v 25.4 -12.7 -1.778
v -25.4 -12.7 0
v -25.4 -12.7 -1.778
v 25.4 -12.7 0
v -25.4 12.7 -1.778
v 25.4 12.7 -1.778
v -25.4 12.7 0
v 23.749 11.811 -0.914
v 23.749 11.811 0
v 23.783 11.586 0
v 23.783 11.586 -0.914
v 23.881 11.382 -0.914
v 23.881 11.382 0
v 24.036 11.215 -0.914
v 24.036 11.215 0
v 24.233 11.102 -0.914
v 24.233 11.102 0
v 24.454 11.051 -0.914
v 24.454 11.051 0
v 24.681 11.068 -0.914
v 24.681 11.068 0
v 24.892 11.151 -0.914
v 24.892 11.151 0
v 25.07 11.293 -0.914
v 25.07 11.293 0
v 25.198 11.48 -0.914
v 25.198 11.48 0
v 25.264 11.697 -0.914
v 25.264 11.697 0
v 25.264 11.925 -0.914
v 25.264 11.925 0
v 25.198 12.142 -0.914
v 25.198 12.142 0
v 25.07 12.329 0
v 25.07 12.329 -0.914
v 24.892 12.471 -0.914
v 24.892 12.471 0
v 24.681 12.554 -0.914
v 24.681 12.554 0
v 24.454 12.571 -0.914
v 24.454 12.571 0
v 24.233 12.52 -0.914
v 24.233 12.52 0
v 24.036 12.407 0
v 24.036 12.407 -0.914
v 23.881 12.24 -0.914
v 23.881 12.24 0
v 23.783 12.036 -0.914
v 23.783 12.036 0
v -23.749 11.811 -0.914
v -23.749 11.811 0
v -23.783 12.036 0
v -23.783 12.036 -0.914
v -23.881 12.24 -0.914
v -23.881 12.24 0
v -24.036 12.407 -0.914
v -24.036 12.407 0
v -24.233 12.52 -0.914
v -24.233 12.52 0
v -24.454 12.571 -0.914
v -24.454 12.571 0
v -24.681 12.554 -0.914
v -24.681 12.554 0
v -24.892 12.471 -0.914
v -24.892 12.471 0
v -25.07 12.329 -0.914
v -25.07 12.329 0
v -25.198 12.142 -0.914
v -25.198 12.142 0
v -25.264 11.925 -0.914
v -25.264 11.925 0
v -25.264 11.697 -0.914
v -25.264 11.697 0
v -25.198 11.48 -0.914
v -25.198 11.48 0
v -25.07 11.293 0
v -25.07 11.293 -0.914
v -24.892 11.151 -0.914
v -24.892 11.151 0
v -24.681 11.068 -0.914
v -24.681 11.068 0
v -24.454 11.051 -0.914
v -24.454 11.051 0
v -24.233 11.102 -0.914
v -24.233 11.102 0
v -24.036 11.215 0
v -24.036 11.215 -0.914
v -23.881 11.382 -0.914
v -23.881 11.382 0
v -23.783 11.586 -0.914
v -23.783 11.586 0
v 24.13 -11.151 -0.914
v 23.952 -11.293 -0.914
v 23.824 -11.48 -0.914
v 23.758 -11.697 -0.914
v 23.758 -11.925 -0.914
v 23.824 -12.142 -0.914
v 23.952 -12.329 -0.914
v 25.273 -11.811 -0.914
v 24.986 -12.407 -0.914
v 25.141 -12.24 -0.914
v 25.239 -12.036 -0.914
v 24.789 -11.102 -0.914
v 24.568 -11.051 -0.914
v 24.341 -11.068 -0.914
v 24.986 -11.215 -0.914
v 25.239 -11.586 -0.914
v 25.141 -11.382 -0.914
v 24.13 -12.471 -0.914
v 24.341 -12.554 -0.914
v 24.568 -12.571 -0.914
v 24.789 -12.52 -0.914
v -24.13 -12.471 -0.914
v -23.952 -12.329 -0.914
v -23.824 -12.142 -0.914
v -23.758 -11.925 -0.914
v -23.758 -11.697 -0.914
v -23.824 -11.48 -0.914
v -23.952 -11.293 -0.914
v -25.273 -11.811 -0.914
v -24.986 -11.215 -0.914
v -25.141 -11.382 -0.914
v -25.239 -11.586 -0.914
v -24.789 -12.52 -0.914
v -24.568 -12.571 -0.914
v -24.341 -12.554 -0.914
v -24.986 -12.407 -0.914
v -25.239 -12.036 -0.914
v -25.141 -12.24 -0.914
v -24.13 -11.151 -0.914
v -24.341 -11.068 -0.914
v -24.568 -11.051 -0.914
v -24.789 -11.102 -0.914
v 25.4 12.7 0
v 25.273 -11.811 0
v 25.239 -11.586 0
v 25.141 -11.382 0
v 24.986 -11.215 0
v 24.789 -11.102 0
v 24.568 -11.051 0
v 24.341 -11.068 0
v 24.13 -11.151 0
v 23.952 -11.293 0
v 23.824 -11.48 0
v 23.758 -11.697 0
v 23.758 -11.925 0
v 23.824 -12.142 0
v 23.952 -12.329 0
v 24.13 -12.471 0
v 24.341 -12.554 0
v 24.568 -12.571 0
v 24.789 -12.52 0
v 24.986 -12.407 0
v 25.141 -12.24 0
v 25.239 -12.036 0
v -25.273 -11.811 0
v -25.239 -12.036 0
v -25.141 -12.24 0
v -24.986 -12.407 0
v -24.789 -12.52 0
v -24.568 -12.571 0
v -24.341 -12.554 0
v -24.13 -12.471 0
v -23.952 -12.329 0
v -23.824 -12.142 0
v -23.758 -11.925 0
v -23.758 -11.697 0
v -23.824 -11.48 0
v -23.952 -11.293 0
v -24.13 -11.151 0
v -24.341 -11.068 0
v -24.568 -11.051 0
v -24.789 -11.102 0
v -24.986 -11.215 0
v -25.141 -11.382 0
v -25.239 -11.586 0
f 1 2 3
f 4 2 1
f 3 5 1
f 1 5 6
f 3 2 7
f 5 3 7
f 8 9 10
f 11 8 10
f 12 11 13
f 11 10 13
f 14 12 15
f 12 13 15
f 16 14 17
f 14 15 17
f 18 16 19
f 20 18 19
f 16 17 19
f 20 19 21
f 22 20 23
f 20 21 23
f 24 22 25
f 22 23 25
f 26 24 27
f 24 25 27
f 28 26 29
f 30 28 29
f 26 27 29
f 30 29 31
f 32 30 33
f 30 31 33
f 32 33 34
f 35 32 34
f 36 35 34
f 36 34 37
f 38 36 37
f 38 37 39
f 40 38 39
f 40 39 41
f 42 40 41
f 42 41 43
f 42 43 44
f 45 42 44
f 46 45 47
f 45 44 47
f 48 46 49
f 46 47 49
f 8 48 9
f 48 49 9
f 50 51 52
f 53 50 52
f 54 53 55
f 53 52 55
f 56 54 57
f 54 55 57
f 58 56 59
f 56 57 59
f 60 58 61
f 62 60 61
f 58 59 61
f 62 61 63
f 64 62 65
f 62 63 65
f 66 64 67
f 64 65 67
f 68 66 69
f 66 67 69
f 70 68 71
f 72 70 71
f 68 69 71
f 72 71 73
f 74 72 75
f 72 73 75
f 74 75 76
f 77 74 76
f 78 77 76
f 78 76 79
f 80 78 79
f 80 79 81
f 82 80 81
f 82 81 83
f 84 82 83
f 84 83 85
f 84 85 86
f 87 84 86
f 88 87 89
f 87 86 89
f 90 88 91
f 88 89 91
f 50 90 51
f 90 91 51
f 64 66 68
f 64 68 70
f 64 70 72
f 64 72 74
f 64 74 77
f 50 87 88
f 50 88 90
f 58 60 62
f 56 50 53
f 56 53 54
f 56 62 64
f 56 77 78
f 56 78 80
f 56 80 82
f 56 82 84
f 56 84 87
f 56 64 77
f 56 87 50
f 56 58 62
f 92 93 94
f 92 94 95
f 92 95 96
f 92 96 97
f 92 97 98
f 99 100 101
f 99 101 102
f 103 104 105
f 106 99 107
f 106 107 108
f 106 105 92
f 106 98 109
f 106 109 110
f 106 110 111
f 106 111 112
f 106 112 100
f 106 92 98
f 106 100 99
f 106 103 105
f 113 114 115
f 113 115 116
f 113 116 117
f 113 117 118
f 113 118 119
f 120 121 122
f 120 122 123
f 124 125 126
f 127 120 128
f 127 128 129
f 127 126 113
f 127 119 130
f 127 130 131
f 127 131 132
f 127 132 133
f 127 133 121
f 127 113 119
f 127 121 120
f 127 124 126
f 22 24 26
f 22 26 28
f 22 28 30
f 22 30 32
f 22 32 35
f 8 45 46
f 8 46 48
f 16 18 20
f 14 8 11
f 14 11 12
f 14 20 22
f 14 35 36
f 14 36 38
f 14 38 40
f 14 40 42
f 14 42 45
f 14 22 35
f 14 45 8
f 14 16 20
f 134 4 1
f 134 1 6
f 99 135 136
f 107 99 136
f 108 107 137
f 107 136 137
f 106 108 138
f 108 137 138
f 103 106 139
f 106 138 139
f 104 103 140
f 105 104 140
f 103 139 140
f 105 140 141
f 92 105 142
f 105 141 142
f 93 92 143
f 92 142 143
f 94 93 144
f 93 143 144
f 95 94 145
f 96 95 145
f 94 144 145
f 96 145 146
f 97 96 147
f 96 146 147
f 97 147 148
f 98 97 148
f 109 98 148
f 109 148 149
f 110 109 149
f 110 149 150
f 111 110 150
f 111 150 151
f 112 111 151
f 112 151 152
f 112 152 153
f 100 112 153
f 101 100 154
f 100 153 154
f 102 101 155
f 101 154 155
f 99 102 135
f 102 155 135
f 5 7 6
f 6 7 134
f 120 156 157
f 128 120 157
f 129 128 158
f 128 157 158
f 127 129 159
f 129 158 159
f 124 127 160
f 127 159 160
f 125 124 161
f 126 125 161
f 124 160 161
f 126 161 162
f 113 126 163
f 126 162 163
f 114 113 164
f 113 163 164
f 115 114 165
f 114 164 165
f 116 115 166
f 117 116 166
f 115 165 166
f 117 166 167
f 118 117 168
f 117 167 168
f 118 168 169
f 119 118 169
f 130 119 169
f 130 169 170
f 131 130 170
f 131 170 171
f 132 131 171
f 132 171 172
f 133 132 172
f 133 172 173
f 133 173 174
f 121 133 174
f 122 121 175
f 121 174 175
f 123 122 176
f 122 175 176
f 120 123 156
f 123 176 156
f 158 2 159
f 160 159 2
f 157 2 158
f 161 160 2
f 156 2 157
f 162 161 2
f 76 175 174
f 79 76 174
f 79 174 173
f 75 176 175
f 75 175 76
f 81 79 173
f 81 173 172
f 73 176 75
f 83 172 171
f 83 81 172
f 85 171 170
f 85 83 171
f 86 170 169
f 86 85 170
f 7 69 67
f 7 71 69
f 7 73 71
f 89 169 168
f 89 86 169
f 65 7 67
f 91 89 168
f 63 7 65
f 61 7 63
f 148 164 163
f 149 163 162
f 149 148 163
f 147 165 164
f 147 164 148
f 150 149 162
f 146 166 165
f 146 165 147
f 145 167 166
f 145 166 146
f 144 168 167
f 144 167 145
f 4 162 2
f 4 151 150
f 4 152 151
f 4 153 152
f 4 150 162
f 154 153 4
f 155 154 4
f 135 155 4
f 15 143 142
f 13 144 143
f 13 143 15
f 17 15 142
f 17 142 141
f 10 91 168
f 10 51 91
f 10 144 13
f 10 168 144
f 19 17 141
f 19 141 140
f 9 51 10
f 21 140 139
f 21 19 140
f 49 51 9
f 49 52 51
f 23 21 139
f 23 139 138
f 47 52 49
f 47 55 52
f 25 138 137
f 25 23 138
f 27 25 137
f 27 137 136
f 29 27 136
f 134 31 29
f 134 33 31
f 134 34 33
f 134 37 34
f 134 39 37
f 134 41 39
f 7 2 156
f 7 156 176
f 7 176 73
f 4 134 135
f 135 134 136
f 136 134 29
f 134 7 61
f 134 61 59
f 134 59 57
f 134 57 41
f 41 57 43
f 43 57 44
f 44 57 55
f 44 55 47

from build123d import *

# Parameters (mm, degrees)
SKETCH1_W           = 50.8
SKETCH1_H           = 25.4
BOSS_EXTRUDE1_DEPTH = 1.778
SKETCH2_R           = 0.762
CUT_EXTRUDE2_DEPTH  = 0.9144


with BuildPart() as part:
    # Sketch1 → Boss-Extrude1 (new body)
    with BuildSketch(Plane.XY):
        Rectangle(SKETCH1_W, SKETCH1_H)
    extrude(amount=-BOSS_EXTRUDE1_DEPTH)

    # Sketch2 → Cut-Extrude2 (cut)
    with BuildSketch(Plane.XY):
        with Locations((-24.511, 11.811)):
            Circle(SKETCH2_R)
        with Locations(Location((24.511, 11.811, 0), (0, 0, 180))):
            Circle(SKETCH2_R)
        with Locations((24.511, -11.811)):
            Circle(SKETCH2_R)
        with Locations(Location((-24.511, -11.811, 0), (0, 0, 180))):
            Circle(SKETCH2_R)
    extrude(amount=-CUT_EXTRUDE2_DEPTH, mode=Mode.SUBTRACT)


solid = part.part
